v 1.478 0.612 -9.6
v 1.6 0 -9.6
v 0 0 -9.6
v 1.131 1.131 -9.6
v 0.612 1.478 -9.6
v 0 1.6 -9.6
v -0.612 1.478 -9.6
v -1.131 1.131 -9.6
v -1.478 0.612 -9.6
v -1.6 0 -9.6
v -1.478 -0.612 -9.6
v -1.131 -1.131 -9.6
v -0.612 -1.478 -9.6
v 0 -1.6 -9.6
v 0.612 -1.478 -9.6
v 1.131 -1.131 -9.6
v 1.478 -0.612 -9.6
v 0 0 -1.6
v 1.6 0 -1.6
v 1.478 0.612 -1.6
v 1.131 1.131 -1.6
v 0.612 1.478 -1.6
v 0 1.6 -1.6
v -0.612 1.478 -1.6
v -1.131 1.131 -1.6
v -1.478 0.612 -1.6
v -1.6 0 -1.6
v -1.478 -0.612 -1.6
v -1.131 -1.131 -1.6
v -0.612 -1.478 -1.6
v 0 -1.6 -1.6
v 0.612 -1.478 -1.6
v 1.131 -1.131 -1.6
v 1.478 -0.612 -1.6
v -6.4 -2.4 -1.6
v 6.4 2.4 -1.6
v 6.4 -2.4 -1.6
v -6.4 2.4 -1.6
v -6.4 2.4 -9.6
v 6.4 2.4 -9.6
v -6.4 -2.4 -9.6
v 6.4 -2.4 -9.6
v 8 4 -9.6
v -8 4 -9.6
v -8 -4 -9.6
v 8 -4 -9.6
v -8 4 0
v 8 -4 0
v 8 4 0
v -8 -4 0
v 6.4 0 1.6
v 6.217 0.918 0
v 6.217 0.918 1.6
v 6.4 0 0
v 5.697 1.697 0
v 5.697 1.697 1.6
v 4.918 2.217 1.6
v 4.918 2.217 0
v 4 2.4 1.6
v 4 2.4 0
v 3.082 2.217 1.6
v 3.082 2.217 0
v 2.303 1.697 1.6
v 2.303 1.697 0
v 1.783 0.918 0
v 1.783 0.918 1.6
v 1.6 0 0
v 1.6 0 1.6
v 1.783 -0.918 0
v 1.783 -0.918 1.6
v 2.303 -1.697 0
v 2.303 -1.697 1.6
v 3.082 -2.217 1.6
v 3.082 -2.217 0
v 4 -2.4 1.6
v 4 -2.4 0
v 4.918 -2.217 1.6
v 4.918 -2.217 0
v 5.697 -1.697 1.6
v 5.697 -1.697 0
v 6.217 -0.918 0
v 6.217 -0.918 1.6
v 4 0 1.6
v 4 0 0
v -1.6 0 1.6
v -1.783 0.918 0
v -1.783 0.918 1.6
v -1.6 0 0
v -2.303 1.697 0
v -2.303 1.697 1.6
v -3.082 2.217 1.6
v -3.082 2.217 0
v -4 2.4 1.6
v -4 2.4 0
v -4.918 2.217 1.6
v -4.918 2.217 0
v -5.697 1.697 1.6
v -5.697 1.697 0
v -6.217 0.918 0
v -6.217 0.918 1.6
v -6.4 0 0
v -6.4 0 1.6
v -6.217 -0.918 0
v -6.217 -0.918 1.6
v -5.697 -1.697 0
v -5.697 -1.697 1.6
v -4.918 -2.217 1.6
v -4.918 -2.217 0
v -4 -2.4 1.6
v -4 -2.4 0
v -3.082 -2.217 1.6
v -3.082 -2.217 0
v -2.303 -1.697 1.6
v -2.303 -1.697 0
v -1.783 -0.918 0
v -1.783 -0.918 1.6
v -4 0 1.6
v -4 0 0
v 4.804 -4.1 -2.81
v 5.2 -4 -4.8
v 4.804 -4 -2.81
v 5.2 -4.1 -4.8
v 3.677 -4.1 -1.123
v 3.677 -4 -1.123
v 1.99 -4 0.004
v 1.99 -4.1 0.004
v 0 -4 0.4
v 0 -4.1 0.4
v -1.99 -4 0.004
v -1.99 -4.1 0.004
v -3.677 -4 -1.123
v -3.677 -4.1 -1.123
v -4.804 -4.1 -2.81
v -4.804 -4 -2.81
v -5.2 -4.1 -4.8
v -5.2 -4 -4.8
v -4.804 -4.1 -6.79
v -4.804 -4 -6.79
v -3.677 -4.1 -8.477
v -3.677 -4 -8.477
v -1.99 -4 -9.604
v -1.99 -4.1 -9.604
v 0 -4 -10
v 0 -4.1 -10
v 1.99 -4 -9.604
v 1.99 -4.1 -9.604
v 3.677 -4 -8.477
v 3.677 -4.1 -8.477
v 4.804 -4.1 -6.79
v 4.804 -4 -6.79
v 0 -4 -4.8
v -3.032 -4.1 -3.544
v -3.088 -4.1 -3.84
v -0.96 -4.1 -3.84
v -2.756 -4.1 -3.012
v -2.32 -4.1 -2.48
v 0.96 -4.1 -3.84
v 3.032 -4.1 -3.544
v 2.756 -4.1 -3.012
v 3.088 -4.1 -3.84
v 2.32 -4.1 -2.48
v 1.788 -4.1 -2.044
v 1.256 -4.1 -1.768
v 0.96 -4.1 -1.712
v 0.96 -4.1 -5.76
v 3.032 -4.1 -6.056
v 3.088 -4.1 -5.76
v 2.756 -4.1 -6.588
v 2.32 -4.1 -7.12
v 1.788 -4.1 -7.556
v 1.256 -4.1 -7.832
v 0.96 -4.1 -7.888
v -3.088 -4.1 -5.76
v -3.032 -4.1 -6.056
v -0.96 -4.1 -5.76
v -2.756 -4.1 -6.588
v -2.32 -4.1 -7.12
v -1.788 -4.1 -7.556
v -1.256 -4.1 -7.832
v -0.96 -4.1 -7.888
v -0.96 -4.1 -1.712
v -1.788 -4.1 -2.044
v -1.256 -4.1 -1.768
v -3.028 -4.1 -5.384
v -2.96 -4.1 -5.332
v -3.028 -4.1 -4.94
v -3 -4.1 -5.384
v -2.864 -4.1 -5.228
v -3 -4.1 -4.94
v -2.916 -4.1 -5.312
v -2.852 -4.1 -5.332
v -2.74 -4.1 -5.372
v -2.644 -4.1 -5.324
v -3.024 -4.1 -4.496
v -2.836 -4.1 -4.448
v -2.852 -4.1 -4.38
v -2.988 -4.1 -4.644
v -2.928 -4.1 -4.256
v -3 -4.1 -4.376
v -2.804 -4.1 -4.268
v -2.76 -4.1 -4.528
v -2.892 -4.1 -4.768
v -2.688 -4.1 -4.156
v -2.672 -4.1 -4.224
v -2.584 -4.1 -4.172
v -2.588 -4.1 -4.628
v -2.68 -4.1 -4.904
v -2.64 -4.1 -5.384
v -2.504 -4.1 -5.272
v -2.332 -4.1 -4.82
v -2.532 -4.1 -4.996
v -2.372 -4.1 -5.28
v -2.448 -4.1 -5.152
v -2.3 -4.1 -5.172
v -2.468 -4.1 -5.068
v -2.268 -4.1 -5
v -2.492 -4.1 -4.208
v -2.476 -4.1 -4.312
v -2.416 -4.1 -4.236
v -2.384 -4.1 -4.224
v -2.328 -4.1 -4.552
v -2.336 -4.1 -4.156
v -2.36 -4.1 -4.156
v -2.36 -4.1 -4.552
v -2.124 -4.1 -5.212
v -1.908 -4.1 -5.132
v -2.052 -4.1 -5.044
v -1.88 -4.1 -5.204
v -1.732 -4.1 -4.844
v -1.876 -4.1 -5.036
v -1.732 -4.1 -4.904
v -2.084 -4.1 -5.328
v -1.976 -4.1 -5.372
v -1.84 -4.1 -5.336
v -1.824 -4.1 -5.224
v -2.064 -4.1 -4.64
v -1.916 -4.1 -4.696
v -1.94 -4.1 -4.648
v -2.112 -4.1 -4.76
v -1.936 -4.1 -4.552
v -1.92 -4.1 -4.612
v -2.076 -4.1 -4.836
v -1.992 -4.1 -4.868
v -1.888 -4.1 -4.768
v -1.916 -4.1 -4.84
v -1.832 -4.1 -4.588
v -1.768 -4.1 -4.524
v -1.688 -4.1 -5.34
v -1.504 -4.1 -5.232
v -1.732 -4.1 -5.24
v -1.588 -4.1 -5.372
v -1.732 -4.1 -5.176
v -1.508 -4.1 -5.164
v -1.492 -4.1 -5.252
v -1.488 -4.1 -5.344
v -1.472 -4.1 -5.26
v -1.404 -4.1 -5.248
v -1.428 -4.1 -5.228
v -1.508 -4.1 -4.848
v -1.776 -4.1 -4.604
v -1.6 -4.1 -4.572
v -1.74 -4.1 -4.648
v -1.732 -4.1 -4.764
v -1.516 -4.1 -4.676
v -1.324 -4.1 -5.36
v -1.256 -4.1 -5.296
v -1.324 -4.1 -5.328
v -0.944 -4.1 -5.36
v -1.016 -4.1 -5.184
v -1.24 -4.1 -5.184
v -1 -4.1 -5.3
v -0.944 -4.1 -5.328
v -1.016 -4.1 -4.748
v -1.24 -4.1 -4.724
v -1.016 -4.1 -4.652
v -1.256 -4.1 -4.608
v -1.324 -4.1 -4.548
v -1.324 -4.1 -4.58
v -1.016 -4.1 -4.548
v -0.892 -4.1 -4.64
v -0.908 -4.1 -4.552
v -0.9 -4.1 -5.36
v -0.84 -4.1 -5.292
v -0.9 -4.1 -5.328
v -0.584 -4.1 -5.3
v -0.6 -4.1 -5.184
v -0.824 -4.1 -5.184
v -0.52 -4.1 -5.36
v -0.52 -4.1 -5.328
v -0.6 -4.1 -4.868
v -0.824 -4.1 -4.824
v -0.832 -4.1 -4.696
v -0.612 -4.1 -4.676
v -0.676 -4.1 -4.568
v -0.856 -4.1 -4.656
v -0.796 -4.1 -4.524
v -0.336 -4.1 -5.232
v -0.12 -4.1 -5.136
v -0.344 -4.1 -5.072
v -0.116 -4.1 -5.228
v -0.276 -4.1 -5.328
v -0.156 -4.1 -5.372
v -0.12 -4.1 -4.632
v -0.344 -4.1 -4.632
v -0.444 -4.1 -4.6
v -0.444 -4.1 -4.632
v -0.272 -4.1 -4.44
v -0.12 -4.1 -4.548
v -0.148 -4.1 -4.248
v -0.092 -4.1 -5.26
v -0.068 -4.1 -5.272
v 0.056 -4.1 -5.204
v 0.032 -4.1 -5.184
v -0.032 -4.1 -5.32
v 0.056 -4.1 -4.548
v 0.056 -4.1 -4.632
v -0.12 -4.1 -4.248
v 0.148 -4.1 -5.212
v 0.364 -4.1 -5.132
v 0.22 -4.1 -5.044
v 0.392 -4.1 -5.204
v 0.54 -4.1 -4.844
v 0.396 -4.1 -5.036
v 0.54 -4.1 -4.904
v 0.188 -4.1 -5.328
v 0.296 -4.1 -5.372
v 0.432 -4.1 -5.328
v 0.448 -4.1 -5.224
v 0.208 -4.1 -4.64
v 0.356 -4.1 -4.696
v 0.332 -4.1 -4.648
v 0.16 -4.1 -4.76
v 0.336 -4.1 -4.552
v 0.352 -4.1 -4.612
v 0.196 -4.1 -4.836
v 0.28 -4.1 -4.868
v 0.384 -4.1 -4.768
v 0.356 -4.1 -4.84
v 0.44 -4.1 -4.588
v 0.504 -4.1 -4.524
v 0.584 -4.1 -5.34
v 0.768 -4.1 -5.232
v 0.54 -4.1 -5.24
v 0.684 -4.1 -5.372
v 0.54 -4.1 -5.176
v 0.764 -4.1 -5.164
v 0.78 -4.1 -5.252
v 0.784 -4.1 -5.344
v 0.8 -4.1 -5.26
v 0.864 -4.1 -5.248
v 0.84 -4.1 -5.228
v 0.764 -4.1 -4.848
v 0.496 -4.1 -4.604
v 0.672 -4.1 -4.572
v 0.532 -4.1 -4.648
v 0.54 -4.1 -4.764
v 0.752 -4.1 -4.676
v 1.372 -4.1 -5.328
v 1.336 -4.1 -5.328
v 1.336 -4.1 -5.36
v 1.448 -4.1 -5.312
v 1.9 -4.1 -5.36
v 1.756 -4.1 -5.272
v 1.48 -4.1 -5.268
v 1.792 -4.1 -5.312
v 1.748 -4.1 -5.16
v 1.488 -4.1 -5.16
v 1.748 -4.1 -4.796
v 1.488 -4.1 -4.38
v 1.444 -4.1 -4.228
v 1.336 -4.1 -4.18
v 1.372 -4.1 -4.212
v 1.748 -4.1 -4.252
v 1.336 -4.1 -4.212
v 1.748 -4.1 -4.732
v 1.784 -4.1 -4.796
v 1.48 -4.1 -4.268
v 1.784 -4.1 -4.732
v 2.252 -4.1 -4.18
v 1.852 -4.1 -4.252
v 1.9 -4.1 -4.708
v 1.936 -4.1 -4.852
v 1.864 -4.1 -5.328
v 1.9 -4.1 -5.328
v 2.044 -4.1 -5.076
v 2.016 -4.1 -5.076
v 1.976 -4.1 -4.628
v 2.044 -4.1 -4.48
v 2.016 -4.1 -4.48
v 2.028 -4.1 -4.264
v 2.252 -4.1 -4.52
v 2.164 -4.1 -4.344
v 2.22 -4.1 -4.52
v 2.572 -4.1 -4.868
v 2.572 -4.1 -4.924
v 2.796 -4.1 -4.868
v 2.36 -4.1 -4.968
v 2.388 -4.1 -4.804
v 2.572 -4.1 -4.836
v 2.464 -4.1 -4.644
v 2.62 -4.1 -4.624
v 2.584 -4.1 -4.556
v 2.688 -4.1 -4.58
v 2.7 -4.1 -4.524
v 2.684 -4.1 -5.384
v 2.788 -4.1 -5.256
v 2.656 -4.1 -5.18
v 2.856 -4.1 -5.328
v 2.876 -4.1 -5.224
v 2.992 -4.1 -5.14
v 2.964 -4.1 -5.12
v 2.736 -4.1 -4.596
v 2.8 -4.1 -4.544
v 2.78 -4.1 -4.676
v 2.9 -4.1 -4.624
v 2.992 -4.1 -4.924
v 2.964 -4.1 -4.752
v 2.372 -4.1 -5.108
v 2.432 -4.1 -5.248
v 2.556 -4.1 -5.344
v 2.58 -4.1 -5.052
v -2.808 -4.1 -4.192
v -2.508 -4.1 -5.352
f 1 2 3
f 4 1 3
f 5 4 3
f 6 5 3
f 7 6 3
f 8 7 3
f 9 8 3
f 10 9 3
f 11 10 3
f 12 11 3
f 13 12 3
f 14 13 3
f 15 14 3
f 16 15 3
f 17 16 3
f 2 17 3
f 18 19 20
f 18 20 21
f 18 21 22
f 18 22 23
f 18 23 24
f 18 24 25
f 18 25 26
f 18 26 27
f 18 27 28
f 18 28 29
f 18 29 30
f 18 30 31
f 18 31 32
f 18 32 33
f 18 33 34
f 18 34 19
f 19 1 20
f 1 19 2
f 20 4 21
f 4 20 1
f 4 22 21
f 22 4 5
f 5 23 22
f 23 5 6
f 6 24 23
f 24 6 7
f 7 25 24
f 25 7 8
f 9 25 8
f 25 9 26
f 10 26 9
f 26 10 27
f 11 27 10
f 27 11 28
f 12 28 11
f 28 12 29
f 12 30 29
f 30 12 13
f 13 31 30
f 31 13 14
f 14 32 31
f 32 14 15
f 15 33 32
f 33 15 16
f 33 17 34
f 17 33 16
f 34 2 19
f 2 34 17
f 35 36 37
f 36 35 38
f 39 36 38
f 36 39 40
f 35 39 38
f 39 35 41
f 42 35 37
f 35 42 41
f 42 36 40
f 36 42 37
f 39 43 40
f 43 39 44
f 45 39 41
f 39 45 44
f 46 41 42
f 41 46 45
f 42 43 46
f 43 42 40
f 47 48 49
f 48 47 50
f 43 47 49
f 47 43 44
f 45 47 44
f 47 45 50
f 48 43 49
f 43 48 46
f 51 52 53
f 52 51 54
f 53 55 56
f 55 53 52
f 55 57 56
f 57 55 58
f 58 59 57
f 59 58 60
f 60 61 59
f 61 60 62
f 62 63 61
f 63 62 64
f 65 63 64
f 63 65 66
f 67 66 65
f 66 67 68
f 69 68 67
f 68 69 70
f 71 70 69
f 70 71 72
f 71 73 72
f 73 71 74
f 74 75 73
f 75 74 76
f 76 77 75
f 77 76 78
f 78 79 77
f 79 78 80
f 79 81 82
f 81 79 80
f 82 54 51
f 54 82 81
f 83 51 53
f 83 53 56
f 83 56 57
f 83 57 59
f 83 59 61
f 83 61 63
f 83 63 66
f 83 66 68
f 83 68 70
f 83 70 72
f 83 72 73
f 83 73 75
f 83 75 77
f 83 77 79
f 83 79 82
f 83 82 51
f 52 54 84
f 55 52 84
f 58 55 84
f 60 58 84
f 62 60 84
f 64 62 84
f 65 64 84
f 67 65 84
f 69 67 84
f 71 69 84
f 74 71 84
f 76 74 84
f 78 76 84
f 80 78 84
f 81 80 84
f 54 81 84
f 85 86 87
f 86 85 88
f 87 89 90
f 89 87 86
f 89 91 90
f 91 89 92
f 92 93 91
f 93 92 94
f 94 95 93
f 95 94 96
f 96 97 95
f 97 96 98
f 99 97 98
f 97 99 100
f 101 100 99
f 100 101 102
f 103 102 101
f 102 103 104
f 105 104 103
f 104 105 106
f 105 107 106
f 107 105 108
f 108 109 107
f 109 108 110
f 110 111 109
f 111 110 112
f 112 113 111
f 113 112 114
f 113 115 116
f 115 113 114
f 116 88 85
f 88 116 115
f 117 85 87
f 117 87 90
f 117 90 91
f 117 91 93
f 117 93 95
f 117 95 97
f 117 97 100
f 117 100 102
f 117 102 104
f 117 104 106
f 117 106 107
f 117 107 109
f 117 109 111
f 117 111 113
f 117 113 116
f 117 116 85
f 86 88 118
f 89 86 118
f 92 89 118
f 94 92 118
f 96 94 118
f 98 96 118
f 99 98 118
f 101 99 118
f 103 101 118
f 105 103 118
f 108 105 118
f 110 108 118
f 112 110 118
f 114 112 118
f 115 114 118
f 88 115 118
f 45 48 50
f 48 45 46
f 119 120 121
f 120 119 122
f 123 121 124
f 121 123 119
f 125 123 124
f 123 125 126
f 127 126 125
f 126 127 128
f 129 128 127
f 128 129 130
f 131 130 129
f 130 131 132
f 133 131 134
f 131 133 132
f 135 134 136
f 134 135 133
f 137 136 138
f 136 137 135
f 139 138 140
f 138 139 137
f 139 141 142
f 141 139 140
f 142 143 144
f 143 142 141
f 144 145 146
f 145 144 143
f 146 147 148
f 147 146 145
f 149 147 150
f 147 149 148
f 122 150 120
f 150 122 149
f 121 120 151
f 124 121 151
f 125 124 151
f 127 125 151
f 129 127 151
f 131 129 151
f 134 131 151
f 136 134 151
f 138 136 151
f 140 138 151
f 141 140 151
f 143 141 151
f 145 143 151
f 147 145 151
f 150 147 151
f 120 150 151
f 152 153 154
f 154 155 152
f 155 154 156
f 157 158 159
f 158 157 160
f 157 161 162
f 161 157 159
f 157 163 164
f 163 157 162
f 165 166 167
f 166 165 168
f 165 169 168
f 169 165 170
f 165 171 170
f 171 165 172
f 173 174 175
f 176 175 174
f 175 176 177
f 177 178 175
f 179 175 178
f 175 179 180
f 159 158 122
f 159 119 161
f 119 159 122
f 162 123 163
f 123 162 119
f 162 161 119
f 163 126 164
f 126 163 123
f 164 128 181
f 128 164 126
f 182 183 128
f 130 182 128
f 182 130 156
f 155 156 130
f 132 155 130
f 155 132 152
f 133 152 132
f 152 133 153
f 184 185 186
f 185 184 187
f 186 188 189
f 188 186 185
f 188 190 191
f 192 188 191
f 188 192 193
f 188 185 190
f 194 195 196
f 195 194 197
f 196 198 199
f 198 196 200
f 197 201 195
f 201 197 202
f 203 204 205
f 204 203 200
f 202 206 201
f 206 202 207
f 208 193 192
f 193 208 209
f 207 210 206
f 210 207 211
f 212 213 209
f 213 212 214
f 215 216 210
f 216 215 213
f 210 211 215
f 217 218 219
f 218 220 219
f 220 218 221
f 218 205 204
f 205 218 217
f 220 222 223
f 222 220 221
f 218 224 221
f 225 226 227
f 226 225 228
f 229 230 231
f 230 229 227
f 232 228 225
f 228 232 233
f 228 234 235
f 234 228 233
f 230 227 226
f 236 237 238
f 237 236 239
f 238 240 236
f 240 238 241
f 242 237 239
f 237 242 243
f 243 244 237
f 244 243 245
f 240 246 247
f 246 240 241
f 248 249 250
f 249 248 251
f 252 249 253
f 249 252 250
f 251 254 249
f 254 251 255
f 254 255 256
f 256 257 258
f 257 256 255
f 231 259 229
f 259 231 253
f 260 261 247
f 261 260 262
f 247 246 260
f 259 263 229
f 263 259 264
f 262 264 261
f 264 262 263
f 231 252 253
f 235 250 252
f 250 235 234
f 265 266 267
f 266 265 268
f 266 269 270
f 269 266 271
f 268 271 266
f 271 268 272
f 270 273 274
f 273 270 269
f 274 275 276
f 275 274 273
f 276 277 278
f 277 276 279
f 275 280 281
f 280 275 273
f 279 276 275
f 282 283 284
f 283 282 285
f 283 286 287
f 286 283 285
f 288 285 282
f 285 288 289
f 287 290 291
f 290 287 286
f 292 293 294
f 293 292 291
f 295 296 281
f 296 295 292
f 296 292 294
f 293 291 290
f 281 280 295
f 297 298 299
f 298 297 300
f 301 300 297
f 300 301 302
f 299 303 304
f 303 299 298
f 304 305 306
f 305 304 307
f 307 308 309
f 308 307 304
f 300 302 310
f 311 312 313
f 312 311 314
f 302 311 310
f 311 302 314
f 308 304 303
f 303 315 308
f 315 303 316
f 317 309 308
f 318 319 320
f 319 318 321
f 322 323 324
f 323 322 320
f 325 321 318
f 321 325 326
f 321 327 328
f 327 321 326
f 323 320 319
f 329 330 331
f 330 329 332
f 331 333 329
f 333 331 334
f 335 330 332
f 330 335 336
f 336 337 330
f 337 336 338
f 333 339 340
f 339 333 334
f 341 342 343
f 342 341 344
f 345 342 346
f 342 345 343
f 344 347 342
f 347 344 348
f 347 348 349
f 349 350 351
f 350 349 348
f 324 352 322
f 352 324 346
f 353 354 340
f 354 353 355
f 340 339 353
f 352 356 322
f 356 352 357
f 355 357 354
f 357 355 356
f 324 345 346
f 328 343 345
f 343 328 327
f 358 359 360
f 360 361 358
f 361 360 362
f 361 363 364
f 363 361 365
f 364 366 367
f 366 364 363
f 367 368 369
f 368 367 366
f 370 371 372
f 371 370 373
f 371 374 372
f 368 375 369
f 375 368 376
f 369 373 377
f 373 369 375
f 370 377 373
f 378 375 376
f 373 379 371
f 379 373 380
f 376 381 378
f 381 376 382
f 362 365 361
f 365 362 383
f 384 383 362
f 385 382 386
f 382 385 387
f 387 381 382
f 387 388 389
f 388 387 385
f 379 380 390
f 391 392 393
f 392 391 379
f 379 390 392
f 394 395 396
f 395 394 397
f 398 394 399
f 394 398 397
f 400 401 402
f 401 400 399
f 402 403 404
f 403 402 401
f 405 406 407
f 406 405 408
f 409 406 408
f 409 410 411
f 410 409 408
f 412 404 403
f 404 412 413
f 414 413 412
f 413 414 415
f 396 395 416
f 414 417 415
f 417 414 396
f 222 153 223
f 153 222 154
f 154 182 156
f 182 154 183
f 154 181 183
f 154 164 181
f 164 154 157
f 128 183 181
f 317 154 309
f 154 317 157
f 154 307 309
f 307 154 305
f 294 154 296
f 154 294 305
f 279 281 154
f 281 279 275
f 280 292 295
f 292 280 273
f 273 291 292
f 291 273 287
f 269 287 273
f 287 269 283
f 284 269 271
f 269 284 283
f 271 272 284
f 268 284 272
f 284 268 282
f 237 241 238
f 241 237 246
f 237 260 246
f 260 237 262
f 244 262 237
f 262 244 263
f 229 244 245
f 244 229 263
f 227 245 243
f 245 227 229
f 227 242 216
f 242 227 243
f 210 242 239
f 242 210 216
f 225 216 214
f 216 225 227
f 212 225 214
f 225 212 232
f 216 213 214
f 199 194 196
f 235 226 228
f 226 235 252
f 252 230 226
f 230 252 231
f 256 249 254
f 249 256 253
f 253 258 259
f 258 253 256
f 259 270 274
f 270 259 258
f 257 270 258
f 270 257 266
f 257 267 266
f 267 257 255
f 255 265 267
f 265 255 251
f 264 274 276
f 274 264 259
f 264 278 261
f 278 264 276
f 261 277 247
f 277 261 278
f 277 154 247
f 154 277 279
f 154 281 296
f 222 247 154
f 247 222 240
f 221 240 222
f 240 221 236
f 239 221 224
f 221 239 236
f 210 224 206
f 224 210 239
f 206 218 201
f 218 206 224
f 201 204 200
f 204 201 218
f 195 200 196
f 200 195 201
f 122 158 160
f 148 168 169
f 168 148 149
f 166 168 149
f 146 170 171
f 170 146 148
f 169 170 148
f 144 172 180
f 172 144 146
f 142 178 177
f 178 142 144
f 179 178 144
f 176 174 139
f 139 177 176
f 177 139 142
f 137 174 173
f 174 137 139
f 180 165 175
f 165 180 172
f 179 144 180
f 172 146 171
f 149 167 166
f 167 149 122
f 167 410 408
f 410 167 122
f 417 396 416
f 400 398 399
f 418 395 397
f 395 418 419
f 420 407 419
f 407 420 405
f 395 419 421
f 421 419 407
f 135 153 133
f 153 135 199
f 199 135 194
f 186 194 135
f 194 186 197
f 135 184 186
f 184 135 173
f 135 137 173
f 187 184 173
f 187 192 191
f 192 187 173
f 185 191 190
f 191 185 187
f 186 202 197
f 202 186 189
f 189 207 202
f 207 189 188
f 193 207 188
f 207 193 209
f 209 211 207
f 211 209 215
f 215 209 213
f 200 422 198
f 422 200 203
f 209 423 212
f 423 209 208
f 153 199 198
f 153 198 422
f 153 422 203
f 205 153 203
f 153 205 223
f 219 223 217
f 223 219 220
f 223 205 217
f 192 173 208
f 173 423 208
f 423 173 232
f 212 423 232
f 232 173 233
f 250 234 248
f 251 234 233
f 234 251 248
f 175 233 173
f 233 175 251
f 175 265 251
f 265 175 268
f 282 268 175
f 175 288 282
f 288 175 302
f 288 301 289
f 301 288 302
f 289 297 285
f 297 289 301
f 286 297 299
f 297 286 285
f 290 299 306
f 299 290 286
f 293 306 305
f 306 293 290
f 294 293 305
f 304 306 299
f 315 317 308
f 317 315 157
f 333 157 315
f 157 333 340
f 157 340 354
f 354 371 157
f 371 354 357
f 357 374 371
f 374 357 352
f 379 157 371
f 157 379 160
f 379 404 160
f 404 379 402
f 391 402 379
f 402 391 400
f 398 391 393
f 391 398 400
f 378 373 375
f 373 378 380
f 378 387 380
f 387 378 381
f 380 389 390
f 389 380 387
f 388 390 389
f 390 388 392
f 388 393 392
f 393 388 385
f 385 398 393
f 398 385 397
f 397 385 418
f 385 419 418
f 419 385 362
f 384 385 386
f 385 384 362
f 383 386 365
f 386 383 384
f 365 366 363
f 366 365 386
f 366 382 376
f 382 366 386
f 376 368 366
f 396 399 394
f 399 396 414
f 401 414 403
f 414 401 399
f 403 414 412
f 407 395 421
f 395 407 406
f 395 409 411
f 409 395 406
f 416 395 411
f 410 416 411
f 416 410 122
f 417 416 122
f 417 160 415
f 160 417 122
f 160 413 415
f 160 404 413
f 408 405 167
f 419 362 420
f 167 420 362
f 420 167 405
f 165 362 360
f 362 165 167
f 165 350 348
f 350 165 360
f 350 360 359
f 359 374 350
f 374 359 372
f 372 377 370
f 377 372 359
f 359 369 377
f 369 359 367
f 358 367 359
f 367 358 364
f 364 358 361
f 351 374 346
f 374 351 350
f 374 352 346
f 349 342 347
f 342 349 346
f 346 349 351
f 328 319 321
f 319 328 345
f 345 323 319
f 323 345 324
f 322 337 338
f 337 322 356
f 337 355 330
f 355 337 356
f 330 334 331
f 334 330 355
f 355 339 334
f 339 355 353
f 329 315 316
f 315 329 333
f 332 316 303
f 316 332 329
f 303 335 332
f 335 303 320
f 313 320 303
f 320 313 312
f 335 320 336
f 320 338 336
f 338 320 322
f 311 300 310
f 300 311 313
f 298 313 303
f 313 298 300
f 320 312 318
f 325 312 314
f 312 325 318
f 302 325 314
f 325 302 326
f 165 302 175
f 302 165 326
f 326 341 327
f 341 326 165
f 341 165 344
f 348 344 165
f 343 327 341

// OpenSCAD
use <../lib.scad>
use <3004.scad>
use <4263304d.scad>
function ldraw_lib__3004d19() = [
// 0 Brick  1 x  2 with Yellow "Santa Fe" in Dark Green Cross and Thick Border Sticker
// 0 Name: 3004d19.dat
// 0 Author: Vincent Messenet [Cheenzo]
// 0 !LDRAW_ORG Shortcut UPDATE 2025-05
// 0 !LICENSE Licensed under CC BY 4.0 : see CAreadme.txt
// 
// 0 BFC CERTIFY CCW
  [0,"BFC","CERTIFY"],
  [0,"BFC","CCW"],
// 
// 0 !CATEGORY Sticker Shortcut
// 0 !KEYWORDS Bricklink 3004pb095, Set 10133
// 
// 0 !HISTORY 2025-05-28 [OrionP] Official Update 2025-05
// 
// 1 16 0 0 0 1 0 0 0 1 0 0 0 1 3004.dat
  [1,16,0,0,0,1,0,0,0,1,0,0,0,1, ldraw_lib__3004()],
// 1 16 0 12 -10 1 0 0 0 0 -1 0 1 0 4263304d.dat
  [1,16,0,12,-10,1,0,0,0,0,-1,0,1,0, ldraw_lib__4263304d()],
];
module ldraw_lib__3004d19(step=0, col=false, unit=2/5, alt=false, line=0.2, solid=!$preview)
    makepoly(ldraw_lib__3004d19(), step=step, col=col, unit=unit, alt=alt, line=line, solid=solid);
ldraw_lib__3004d19(line=0.2);
